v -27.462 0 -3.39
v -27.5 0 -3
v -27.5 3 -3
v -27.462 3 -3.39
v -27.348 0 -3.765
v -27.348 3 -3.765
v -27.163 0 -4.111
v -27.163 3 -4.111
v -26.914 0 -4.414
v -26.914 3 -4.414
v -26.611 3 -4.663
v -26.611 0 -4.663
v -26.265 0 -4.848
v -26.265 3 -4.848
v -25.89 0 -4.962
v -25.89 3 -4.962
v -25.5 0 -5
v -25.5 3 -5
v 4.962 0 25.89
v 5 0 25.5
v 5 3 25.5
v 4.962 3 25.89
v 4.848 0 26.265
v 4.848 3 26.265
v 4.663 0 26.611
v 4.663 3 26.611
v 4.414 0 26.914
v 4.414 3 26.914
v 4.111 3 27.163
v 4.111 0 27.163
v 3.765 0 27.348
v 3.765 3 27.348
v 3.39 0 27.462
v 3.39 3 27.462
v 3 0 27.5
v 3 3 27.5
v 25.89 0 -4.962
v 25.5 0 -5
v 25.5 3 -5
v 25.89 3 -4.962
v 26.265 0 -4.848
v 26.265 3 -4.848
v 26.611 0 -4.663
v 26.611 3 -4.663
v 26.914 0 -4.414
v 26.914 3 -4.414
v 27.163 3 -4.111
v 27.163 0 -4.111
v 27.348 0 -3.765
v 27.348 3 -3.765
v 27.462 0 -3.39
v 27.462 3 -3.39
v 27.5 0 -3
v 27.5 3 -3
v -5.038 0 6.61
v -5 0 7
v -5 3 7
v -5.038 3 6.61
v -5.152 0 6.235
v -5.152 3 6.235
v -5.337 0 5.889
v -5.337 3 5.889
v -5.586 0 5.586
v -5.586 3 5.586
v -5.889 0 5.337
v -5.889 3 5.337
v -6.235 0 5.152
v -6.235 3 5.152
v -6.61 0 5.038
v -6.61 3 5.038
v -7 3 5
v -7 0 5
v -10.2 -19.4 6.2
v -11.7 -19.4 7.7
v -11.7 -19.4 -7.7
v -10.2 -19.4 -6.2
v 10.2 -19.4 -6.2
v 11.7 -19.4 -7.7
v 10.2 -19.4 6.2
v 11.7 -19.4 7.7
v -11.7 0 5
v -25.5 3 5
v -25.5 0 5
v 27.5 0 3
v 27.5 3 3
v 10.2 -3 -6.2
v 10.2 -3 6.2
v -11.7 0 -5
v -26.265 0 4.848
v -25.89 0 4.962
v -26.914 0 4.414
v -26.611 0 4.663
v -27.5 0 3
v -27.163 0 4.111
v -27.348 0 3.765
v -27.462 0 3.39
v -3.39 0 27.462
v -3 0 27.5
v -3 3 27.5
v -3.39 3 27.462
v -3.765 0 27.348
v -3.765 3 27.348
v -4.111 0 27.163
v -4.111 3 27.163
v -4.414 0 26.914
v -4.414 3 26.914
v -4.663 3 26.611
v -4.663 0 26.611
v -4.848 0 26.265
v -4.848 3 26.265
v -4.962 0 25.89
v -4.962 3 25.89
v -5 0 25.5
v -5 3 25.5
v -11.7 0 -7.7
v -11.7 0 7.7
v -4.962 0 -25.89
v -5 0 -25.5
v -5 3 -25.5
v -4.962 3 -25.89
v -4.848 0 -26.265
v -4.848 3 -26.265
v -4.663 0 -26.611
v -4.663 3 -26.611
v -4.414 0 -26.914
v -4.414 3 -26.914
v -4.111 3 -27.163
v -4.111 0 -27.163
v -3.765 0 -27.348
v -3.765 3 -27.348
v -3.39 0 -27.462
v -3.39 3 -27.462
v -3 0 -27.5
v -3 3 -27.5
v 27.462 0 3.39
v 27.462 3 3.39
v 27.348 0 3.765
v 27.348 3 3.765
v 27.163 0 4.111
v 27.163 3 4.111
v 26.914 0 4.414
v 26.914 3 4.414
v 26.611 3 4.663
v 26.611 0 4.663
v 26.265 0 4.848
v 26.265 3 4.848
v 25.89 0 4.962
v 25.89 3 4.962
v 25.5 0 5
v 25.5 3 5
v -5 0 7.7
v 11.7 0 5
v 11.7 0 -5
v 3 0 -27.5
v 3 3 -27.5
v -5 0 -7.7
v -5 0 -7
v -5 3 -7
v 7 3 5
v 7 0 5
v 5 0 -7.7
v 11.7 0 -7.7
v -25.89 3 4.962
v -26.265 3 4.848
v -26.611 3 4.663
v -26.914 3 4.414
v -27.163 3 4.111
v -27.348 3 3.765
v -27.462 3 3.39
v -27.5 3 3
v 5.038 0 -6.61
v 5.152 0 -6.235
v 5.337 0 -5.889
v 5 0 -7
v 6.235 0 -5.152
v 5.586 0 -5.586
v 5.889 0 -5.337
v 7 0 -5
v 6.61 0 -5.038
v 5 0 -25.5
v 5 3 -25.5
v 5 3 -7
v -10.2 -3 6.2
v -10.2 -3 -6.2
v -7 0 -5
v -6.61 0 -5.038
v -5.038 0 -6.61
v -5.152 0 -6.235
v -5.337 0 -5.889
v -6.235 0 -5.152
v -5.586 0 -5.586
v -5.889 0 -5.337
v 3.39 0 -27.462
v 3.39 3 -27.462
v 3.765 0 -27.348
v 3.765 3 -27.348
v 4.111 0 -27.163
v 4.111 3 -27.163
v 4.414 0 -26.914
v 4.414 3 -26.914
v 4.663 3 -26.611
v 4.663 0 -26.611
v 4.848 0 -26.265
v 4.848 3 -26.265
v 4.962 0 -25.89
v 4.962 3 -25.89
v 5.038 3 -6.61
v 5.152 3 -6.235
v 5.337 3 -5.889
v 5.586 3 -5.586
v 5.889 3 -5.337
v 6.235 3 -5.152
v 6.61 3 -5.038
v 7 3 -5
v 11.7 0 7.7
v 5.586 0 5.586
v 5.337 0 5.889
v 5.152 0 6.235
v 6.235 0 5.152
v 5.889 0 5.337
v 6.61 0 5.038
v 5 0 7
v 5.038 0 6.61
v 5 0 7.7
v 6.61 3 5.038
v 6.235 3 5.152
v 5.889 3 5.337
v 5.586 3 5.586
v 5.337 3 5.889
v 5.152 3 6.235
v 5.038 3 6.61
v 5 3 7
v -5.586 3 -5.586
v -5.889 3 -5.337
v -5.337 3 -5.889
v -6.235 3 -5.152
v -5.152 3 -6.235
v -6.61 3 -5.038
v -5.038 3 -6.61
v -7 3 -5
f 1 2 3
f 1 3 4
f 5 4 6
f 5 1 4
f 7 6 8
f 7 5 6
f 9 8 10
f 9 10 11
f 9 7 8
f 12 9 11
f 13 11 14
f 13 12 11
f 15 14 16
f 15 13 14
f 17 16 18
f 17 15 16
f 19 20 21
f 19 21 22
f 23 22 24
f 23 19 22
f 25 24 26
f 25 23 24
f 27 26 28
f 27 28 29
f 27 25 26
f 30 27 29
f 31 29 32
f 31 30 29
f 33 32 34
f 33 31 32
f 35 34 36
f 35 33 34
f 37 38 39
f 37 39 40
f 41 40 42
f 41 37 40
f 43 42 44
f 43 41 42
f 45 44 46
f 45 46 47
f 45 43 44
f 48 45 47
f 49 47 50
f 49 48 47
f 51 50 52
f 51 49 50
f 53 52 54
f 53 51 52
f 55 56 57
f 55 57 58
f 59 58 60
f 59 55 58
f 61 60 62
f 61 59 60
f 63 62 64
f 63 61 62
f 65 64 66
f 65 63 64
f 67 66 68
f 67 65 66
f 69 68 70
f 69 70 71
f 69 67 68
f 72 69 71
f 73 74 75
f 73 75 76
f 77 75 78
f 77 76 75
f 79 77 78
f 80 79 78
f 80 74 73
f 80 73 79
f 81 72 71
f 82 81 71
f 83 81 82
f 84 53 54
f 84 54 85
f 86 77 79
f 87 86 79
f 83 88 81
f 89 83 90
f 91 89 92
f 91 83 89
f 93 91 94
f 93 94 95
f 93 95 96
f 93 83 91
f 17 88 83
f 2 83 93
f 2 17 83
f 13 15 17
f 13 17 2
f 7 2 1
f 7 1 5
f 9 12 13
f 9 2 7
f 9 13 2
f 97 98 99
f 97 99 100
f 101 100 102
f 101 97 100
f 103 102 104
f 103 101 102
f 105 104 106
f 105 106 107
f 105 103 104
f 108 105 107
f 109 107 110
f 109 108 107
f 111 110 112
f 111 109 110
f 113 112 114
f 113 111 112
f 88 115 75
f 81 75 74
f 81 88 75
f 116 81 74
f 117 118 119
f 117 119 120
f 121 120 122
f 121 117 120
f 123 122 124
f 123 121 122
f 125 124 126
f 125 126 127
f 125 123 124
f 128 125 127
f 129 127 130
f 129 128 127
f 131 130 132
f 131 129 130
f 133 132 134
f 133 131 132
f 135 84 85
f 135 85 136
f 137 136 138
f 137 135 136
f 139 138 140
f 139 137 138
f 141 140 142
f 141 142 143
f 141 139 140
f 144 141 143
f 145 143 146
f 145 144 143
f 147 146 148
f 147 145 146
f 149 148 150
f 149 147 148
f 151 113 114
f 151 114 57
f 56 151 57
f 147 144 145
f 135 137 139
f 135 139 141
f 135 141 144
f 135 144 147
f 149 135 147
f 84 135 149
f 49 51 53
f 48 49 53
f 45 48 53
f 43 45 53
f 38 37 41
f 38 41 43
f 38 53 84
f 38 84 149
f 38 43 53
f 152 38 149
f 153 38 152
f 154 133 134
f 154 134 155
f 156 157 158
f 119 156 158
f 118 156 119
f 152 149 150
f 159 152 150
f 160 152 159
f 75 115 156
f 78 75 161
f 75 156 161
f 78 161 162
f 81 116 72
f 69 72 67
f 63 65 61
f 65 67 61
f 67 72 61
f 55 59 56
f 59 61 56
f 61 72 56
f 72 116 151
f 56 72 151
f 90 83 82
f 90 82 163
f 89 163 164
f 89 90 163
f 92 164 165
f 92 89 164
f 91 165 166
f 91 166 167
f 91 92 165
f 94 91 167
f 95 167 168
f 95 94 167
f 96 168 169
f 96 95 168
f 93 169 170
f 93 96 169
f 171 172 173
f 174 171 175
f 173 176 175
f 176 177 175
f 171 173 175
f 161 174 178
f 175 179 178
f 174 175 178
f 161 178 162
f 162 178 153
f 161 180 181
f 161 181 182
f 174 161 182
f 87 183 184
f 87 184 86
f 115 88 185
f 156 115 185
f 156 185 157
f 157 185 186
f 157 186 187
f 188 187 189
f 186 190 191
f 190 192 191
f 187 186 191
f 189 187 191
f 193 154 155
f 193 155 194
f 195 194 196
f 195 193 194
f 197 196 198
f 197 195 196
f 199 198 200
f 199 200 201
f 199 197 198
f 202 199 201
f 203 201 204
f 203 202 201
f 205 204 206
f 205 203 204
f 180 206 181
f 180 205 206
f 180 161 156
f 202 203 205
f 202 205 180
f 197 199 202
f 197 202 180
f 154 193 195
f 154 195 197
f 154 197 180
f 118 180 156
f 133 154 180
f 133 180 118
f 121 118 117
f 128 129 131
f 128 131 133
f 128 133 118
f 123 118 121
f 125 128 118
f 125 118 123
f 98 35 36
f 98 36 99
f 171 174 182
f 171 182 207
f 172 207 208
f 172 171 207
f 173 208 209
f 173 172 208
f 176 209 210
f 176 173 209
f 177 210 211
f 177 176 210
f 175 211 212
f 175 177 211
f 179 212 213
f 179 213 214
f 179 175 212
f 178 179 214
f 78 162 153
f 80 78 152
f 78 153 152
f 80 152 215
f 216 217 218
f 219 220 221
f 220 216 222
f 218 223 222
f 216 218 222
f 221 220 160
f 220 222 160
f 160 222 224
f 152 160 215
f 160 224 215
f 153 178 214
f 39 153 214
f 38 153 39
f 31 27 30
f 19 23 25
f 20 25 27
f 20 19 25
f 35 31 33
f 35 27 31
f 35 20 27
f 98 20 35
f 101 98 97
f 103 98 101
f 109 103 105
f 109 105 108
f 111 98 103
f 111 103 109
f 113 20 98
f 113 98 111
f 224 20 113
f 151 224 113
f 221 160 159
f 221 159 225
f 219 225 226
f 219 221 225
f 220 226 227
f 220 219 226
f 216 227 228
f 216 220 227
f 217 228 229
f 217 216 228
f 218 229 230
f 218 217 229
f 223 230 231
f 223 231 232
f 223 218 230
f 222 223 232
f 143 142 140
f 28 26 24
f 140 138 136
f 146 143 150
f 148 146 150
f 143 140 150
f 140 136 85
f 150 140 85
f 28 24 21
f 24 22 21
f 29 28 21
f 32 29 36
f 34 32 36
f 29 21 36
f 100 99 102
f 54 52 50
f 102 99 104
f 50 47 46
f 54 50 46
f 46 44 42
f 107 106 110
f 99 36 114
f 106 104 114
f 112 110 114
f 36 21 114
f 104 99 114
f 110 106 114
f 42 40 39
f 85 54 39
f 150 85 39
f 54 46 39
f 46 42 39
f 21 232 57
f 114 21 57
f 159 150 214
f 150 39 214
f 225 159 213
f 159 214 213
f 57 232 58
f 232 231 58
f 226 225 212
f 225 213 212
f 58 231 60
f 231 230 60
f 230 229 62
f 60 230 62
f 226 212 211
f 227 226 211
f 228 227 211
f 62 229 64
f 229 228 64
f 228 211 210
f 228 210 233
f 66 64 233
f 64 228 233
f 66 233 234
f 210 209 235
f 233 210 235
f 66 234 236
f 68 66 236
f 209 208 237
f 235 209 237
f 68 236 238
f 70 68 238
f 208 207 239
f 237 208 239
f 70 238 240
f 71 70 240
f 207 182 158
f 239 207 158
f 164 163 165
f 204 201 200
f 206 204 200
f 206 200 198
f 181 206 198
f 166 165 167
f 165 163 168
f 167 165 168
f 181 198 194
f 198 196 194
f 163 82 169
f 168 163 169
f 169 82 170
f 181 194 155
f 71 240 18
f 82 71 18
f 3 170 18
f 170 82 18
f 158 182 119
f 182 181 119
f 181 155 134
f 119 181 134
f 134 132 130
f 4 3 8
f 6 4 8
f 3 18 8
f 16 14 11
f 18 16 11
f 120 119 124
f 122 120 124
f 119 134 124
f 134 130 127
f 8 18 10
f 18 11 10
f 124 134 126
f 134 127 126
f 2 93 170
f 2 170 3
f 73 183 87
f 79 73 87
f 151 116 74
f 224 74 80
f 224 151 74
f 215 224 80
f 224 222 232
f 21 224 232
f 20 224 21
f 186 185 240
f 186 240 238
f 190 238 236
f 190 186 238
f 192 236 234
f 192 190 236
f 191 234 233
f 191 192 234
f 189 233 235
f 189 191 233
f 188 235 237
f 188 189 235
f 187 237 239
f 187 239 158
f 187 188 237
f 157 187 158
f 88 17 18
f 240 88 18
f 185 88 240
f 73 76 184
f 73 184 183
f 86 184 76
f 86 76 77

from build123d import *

# Parameters (mm, degrees)
EXTRUDE_1_DEPTH = 3
SKETCH_2_W      = 23.4
SKETCH_2_H      = 15.4
EXTRUDE_2_DEPTH = 3
SKETCH_4_W      = 23.4
SKETCH_4_H      = 15.4
SKETCH_4_W_2    = 20.4
SKETCH_4_H_2    = 12.4
EXTRUDE_4_DEPTH = 16.4


with BuildPart() as part:
    # 草图1 → 凸台-拉伸1 (new body)
    with BuildSketch(Plane(origin=(0, 0, 0), x_dir=(1, 0, 0), z_dir=(0, 1, 0))):
        with BuildLine():
            Line((7, 5), (25.5, 5))
            ThreePointArc((25.5, 5), (26.914213562, 4.414213562), (27.5, 3))
            Line((27.5, 3), (27.5, -3))
            ThreePointArc((27.5, -3), (26.914213562, -4.414213562), (25.5, -5))
            Line((25.5, -5), (7, -5))
            ThreePointArc((7, -5), (5.585786438, -5.585786438), (5, -7))
            Line((5, -7), (5, -25.5))
            ThreePointArc((5, -25.5), (4.414213562, -26.914213562), (3, -27.5))
            Line((3, -27.5), (-3, -27.5))
            ThreePointArc((-3, -27.5), (-4.414213562, -26.914213562), (-5, -25.5))
            Line((-5, -25.5), (-5, -7))
            ThreePointArc((-5, -7), (-5.585786438, -5.585786438), (-7, -5))
            Line((-7, -5), (-25.5, -5))
            ThreePointArc((-25.5, -5), (-26.914213562, -4.414213562), (-27.5, -3))
            Line((-27.5, -3), (-27.5, 3))
            ThreePointArc((-27.5, 3), (-26.914213562, 4.414213562), (-25.5, 5))
            Line((-25.5, 5), (-7, 5))
            ThreePointArc((-7, 5), (-5.585786438, 5.585786438), (-5, 7))
            Line((-5, 7), (-5, 25.5))
            ThreePointArc((-5, 25.5), (-4.414213562, 26.914213562), (-3, 27.5))
            Line((-3, 27.5), (3, 27.5))
            ThreePointArc((3, 27.5), (4.414213562, 26.914213562), (5, 25.5))
            Line((5, 25.5), (5, 7))
            ThreePointArc((5, 7), (5.585786438, 5.585786438), (7, 5))
        make_face()
    extrude(amount=EXTRUDE_1_DEPTH)

    # 草图2 → 凸台-拉伸2 (add)
    with BuildSketch(Plane.XZ):
        Rectangle(SKETCH_2_W, SKETCH_2_H)
    extrude(amount=EXTRUDE_2_DEPTH)

    # 草图4 → 凸台-拉伸4 (add)
    with BuildSketch(Plane.XZ.offset(3)):
        Rectangle(SKETCH_4_W, SKETCH_4_H)
        Rectangle(SKETCH_4_W_2, SKETCH_4_H_2, mode=Mode.SUBTRACT)
    extrude(amount=EXTRUDE_4_DEPTH)


solid = part.part
